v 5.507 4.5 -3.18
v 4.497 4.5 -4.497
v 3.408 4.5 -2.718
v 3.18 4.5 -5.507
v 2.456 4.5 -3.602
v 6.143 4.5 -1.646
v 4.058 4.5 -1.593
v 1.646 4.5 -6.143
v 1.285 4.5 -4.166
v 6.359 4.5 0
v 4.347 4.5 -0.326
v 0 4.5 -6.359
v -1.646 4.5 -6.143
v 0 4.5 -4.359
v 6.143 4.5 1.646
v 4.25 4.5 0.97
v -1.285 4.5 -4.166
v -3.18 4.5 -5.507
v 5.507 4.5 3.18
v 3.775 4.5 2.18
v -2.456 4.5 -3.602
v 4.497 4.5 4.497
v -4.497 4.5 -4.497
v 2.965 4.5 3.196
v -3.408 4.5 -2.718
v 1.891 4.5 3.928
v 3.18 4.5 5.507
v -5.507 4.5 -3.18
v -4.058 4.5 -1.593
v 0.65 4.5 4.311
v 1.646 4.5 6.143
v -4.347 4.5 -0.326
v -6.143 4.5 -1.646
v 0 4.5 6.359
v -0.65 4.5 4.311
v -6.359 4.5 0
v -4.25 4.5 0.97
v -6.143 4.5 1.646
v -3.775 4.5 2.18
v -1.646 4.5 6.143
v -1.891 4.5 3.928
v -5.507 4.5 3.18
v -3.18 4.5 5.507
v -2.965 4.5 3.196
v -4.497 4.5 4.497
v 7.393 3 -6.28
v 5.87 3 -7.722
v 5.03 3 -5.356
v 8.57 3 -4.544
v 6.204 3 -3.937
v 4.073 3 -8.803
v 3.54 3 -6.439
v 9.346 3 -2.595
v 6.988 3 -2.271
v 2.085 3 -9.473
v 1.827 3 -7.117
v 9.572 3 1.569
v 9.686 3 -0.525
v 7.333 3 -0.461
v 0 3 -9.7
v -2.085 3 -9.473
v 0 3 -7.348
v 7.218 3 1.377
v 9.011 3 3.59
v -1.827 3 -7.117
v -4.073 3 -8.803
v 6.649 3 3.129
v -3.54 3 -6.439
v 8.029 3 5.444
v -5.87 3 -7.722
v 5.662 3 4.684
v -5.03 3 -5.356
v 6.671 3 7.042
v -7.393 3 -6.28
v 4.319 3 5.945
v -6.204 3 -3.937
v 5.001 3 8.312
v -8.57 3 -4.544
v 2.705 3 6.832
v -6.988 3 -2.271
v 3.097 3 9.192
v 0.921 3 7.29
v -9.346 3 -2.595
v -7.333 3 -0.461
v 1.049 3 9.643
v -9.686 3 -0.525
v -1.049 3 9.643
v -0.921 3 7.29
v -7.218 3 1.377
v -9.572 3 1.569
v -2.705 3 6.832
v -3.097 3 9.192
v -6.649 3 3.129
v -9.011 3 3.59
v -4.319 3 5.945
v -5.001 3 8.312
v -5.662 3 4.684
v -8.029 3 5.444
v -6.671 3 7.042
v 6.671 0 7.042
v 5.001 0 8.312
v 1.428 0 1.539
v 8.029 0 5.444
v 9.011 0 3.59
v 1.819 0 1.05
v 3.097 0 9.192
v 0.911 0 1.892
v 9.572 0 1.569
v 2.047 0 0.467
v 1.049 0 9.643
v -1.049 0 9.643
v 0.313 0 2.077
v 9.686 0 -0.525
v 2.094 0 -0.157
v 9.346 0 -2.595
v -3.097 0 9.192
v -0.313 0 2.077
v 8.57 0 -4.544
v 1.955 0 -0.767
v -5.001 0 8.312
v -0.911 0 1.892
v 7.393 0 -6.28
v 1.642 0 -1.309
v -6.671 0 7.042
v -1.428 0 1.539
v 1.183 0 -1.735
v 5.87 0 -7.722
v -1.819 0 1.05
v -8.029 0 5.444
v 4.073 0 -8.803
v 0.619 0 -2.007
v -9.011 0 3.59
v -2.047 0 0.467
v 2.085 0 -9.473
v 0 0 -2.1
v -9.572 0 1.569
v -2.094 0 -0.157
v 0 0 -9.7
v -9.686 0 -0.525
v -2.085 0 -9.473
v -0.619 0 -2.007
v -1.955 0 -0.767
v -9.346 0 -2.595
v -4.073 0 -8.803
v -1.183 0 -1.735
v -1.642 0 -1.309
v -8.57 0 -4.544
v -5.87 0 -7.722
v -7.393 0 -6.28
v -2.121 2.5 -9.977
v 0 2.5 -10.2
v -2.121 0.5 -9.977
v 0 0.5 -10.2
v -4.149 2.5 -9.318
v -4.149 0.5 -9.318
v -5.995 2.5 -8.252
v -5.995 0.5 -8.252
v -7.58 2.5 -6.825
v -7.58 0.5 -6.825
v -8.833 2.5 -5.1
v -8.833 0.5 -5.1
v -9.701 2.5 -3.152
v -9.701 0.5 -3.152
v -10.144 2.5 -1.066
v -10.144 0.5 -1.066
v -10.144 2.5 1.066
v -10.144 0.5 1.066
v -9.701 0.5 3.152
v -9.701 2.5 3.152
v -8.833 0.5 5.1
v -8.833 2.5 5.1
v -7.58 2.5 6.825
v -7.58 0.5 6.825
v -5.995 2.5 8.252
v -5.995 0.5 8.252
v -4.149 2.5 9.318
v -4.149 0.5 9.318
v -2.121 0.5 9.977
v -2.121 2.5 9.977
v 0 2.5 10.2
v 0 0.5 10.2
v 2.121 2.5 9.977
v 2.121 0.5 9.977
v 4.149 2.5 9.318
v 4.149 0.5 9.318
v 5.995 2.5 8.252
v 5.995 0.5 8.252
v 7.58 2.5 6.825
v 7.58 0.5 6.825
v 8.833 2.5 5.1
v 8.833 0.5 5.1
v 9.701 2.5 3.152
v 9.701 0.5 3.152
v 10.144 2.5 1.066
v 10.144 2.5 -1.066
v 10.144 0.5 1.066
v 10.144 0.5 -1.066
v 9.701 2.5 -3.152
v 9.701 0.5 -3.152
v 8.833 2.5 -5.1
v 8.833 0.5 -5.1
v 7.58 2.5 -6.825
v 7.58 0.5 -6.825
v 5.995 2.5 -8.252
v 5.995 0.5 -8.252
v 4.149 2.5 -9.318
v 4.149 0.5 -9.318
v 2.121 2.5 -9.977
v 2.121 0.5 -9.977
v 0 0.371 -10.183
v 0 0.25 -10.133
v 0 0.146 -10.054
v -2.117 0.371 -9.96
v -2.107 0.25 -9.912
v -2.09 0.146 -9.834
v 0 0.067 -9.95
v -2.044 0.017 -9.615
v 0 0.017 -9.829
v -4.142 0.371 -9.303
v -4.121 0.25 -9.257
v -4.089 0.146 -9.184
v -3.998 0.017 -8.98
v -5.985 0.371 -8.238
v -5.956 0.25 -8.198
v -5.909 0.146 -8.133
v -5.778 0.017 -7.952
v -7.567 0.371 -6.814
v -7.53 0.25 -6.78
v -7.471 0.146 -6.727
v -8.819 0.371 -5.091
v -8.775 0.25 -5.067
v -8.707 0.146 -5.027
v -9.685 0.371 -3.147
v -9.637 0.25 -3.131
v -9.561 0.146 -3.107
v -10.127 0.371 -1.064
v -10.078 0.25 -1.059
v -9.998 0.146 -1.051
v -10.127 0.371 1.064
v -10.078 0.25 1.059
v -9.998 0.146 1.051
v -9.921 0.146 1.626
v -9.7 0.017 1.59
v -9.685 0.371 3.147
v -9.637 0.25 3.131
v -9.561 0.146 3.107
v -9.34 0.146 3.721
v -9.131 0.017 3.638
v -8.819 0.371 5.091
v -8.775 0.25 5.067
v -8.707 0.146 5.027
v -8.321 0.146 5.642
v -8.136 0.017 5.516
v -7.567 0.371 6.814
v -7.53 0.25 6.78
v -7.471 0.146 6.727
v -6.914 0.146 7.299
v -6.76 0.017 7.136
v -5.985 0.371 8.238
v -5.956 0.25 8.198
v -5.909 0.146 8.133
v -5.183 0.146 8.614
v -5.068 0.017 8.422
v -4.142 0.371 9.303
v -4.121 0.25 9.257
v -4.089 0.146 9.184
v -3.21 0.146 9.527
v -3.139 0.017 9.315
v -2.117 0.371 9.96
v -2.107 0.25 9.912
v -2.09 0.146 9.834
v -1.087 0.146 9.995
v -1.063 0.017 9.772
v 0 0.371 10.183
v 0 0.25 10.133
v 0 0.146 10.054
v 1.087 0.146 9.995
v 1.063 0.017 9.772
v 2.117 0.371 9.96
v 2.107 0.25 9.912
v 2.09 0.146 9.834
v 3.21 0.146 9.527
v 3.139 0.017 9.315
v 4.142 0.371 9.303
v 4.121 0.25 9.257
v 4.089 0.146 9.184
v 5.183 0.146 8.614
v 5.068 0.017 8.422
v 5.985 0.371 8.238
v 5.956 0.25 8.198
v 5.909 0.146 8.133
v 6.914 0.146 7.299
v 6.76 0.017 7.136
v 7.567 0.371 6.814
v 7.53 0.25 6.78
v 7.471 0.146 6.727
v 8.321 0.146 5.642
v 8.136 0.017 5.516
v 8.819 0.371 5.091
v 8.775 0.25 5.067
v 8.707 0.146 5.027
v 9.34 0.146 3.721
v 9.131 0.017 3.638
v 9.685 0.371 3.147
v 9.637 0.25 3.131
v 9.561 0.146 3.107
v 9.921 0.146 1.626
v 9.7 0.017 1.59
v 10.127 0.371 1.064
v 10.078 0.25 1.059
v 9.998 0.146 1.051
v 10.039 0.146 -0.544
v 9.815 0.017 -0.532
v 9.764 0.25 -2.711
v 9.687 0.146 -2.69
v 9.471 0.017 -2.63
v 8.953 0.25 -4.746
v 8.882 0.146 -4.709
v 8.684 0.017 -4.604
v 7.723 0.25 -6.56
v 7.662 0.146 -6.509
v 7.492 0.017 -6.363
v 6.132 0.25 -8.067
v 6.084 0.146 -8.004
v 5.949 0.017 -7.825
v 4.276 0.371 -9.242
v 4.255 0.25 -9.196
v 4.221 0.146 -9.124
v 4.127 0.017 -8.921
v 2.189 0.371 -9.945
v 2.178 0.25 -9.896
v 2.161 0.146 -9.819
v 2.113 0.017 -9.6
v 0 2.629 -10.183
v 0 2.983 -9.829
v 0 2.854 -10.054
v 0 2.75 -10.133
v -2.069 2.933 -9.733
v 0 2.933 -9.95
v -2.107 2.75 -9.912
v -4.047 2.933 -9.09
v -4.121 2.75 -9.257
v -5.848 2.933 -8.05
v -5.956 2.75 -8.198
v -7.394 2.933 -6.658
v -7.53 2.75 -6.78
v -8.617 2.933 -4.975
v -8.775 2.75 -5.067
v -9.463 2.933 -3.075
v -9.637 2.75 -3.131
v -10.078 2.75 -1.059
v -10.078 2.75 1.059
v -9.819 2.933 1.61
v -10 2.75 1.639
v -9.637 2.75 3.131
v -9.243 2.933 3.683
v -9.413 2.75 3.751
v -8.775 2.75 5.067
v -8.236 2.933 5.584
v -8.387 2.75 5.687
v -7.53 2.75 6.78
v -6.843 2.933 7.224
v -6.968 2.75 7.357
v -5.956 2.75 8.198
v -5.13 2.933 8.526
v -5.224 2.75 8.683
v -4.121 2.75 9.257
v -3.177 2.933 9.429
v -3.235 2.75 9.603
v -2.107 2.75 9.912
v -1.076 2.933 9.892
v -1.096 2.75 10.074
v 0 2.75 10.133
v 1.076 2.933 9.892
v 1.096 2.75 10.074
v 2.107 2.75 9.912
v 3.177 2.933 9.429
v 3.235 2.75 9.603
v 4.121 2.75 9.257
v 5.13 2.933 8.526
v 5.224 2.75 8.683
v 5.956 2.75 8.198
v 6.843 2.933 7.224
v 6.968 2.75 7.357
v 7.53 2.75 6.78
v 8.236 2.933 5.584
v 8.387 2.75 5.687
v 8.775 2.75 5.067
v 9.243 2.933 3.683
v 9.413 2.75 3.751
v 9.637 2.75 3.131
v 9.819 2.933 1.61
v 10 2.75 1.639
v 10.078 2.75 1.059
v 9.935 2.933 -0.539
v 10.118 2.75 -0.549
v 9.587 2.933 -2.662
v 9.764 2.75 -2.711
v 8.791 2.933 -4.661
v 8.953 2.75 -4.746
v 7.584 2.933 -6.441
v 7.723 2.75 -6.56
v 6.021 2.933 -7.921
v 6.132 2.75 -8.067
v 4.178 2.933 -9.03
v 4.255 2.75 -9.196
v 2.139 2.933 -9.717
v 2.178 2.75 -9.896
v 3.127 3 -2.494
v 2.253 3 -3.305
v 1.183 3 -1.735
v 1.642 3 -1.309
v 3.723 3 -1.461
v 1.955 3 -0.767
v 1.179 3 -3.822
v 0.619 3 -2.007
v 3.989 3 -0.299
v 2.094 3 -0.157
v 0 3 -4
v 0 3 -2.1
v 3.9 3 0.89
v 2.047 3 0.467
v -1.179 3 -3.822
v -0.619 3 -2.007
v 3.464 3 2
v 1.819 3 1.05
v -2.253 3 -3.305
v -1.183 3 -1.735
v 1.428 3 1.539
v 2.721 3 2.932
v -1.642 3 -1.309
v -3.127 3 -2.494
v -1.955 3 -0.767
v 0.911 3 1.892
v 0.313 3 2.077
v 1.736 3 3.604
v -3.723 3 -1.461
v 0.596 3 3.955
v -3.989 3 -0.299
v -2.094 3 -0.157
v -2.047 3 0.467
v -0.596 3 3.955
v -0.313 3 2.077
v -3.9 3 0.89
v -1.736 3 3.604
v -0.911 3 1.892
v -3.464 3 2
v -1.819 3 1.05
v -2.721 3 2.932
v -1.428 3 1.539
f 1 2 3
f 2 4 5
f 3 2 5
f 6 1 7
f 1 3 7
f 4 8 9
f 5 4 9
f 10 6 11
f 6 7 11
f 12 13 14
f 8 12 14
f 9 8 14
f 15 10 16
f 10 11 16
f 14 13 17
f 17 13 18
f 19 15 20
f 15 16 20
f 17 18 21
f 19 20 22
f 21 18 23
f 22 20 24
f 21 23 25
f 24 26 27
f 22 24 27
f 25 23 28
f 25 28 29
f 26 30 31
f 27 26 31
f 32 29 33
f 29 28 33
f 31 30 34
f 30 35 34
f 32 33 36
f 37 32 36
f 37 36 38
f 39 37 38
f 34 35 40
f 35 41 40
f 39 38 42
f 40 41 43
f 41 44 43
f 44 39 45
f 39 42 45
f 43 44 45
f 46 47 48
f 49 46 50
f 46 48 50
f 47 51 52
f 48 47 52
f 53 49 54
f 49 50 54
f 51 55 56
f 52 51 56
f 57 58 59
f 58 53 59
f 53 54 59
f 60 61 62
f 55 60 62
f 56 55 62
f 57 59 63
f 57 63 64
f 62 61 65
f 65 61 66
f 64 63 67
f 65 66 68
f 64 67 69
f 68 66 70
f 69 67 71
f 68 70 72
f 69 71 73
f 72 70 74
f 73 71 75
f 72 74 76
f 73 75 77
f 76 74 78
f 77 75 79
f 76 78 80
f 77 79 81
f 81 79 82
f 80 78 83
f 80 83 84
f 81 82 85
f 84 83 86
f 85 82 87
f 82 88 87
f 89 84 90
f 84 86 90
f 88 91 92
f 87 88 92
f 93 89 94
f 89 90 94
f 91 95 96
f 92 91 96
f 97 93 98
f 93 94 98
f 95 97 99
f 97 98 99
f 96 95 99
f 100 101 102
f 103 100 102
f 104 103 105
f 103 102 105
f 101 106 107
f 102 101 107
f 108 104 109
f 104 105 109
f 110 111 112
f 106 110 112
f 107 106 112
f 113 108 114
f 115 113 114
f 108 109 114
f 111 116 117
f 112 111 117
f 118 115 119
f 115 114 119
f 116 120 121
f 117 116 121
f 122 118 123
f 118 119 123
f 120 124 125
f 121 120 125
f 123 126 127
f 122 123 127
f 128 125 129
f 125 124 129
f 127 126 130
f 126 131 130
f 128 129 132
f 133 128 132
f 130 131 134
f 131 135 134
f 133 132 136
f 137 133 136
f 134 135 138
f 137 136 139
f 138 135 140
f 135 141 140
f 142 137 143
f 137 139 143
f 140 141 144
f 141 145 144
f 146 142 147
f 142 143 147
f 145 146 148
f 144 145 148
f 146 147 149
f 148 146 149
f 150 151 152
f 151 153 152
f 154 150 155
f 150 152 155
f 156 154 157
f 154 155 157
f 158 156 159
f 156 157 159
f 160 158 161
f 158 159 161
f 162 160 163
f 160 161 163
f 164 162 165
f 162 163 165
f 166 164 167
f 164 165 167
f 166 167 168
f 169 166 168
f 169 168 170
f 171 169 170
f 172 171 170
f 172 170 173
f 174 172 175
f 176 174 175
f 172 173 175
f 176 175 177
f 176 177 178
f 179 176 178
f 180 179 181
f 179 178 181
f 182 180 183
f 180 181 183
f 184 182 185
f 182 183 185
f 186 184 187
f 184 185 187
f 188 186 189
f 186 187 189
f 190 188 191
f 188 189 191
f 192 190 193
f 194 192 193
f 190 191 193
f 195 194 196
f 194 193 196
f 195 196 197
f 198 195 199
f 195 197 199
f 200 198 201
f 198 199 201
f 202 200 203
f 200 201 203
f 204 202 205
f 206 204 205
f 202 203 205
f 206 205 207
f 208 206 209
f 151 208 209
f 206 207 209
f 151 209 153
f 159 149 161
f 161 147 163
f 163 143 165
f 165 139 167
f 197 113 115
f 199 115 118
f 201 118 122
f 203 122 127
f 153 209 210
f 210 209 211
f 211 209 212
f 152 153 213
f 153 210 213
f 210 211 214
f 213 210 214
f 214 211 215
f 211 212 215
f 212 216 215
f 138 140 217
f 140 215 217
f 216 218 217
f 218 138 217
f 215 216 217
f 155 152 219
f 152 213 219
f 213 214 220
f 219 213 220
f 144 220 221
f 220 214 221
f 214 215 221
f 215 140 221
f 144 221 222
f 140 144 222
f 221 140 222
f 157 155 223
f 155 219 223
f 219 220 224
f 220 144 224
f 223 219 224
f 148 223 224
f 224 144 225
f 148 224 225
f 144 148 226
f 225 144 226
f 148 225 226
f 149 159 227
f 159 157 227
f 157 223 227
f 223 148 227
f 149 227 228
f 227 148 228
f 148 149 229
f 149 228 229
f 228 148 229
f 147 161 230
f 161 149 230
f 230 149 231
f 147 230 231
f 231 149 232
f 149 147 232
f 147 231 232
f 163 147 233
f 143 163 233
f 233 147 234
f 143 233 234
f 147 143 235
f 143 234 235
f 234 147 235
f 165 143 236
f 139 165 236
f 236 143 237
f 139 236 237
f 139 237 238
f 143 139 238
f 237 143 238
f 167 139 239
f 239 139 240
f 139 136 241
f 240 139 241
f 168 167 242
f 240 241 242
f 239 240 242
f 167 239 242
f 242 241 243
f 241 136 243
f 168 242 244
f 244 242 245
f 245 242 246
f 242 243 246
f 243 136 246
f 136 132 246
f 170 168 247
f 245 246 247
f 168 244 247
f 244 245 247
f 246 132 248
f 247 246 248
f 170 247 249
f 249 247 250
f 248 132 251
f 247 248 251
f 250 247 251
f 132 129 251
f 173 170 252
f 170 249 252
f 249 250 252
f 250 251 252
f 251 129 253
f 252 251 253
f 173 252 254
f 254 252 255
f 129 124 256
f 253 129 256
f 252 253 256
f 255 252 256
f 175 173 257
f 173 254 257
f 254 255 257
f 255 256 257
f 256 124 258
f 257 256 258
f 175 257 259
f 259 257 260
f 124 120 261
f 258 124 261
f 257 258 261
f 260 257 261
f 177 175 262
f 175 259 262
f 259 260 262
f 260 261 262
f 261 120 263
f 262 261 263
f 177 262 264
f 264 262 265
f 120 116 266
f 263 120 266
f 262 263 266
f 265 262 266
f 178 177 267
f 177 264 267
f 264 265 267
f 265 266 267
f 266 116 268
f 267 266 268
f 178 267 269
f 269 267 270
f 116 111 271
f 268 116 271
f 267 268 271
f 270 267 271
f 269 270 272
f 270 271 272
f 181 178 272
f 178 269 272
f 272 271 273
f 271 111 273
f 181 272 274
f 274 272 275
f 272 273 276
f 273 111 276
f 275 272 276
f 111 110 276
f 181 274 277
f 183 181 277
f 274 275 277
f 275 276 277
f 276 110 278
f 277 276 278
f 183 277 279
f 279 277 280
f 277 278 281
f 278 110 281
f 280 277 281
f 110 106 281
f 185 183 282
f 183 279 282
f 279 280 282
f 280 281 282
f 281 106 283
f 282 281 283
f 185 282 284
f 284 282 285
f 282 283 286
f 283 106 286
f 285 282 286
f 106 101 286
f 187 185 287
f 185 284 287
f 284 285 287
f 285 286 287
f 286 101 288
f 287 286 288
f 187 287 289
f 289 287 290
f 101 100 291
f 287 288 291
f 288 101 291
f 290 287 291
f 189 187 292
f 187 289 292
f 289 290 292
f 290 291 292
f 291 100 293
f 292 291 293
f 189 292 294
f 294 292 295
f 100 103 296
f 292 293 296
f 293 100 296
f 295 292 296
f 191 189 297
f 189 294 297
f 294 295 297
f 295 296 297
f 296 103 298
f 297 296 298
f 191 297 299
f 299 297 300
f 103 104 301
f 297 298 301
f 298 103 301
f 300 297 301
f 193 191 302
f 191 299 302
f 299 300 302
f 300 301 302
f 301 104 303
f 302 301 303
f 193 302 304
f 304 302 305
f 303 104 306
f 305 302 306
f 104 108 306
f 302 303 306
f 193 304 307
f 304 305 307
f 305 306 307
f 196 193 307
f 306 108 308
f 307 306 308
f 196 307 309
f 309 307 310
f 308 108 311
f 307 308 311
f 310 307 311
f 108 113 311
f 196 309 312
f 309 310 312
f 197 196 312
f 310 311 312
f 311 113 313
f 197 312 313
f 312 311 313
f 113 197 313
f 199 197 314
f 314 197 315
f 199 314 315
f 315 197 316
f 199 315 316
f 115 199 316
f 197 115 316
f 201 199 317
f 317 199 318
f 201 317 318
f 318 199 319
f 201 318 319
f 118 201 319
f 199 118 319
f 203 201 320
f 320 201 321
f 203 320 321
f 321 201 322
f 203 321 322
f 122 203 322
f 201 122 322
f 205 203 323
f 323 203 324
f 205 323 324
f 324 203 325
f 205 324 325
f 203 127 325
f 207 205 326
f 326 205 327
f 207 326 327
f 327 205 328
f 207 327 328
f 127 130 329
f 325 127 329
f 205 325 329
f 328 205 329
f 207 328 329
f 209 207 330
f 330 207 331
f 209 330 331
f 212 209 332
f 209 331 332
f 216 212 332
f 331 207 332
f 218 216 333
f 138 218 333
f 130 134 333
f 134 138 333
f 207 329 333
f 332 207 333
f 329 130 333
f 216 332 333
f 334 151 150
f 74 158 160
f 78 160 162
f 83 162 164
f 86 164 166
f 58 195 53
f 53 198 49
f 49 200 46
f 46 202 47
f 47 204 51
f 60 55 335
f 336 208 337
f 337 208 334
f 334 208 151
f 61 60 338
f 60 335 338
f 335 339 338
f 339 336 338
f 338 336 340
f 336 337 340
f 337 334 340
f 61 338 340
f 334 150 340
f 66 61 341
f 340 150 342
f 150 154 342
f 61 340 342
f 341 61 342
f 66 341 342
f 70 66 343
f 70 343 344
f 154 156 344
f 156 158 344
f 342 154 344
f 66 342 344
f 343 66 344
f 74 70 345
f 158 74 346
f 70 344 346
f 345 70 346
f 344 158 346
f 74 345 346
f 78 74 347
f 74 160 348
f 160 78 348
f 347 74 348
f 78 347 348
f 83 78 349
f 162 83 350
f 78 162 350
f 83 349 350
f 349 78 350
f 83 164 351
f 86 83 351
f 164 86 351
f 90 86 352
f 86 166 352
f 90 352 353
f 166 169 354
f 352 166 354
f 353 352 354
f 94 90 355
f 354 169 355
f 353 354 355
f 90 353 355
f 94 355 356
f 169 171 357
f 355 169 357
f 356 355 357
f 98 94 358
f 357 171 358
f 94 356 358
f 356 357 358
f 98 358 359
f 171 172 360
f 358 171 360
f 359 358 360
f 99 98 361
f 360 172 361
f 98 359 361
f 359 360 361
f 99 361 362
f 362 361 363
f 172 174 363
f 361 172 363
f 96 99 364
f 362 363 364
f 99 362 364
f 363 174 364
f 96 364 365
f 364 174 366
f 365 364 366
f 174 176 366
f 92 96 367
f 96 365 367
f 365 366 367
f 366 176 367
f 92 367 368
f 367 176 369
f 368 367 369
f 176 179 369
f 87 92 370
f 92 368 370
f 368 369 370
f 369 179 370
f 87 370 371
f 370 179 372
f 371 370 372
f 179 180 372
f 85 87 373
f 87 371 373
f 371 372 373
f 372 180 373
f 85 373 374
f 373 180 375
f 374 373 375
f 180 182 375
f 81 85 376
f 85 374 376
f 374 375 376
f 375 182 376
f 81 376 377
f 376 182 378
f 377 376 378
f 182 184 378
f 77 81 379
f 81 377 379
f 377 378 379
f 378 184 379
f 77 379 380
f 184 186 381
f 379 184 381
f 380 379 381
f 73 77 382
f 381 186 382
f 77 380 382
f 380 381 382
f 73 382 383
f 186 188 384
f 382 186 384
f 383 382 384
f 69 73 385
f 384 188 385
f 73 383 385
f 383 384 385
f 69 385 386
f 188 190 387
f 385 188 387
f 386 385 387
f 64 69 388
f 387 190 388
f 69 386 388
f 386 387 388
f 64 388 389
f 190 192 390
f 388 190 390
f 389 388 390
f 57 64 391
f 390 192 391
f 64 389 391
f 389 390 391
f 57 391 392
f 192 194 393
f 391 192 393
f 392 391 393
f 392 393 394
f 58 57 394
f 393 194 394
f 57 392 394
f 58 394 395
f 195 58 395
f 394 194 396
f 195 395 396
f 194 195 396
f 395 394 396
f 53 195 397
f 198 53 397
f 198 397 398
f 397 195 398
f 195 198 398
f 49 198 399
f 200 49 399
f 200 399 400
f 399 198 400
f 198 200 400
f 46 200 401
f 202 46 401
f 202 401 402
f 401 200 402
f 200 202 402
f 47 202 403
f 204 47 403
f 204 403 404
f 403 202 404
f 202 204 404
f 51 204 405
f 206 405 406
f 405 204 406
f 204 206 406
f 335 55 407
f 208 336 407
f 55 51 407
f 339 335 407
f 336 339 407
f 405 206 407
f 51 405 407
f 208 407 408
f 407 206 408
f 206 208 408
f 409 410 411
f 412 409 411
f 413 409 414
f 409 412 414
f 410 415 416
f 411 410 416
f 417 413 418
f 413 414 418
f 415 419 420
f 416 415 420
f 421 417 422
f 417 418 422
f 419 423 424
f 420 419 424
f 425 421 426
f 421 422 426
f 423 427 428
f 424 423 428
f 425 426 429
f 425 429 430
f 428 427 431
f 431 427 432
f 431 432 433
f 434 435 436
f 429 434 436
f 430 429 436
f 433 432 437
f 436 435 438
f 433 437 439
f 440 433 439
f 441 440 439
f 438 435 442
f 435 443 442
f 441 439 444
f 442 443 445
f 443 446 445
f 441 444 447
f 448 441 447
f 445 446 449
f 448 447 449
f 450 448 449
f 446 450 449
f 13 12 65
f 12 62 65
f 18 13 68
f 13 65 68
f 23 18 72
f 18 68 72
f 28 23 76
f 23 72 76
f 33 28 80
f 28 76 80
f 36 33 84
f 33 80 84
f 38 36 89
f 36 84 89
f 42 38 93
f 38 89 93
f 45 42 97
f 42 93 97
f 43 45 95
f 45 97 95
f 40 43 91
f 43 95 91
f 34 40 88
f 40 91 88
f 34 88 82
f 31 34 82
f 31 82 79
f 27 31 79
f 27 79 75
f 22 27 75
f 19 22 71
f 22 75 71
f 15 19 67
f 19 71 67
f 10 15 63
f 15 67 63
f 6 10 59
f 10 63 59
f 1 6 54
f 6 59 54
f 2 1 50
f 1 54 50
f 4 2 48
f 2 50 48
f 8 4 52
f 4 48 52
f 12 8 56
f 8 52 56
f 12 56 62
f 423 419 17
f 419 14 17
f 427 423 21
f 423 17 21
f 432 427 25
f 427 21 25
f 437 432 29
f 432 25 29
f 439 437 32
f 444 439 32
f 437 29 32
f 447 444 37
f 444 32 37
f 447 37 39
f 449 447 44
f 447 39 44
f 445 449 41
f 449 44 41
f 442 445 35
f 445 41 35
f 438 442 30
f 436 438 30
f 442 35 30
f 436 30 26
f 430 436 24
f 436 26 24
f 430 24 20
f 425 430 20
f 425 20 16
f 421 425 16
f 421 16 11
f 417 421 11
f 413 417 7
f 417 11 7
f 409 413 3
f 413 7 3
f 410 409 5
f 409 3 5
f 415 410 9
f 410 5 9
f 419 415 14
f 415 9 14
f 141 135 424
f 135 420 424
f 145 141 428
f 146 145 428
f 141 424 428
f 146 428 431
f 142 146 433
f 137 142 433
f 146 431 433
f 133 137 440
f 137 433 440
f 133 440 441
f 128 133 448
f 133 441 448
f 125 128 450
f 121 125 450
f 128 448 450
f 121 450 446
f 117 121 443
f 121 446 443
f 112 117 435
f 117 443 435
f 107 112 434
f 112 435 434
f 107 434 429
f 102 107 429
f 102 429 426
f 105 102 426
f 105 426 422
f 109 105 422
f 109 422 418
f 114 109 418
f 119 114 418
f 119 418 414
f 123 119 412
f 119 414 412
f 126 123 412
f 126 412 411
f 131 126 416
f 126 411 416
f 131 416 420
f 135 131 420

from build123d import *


with BuildPart() as part:
    # Sketch1 → Revolve1 (revolve)
    with BuildSketch(Plane.XY, mode=Mode.PRIVATE) as revolve1_sk:
        with BuildLine():
            Line((2.1, 0), (2.1, 3))
            Line((2.1, 3), (4, 3))
            Line((4, 3), (4.359369746, 4.5))
            Line((4.359369746, 4.5), (6.359369746, 4.5))
            Line((6.359369746, 4.5), (7.347987035, 3))
            Line((7.347987035, 3), (9.7, 3))
            ThreePointArc((9.7, 3), (10.053553391, 2.853553391), (10.2, 2.5))
            Line((10.2, 2.5), (10.2, 0.5))
            ThreePointArc((10.2, 0.5), (10.053553391, 0.146446609), (9.7, 0))
            Line((9.7, 0), (2.1, 0))
        make_face()
    revolve(revolve1_sk.sketch.rotate(Axis((0, 0, 0), (0, 1, 0)), 90), axis=Axis((0, 0, 0), (0, 1, 0)))


solid = part.part
